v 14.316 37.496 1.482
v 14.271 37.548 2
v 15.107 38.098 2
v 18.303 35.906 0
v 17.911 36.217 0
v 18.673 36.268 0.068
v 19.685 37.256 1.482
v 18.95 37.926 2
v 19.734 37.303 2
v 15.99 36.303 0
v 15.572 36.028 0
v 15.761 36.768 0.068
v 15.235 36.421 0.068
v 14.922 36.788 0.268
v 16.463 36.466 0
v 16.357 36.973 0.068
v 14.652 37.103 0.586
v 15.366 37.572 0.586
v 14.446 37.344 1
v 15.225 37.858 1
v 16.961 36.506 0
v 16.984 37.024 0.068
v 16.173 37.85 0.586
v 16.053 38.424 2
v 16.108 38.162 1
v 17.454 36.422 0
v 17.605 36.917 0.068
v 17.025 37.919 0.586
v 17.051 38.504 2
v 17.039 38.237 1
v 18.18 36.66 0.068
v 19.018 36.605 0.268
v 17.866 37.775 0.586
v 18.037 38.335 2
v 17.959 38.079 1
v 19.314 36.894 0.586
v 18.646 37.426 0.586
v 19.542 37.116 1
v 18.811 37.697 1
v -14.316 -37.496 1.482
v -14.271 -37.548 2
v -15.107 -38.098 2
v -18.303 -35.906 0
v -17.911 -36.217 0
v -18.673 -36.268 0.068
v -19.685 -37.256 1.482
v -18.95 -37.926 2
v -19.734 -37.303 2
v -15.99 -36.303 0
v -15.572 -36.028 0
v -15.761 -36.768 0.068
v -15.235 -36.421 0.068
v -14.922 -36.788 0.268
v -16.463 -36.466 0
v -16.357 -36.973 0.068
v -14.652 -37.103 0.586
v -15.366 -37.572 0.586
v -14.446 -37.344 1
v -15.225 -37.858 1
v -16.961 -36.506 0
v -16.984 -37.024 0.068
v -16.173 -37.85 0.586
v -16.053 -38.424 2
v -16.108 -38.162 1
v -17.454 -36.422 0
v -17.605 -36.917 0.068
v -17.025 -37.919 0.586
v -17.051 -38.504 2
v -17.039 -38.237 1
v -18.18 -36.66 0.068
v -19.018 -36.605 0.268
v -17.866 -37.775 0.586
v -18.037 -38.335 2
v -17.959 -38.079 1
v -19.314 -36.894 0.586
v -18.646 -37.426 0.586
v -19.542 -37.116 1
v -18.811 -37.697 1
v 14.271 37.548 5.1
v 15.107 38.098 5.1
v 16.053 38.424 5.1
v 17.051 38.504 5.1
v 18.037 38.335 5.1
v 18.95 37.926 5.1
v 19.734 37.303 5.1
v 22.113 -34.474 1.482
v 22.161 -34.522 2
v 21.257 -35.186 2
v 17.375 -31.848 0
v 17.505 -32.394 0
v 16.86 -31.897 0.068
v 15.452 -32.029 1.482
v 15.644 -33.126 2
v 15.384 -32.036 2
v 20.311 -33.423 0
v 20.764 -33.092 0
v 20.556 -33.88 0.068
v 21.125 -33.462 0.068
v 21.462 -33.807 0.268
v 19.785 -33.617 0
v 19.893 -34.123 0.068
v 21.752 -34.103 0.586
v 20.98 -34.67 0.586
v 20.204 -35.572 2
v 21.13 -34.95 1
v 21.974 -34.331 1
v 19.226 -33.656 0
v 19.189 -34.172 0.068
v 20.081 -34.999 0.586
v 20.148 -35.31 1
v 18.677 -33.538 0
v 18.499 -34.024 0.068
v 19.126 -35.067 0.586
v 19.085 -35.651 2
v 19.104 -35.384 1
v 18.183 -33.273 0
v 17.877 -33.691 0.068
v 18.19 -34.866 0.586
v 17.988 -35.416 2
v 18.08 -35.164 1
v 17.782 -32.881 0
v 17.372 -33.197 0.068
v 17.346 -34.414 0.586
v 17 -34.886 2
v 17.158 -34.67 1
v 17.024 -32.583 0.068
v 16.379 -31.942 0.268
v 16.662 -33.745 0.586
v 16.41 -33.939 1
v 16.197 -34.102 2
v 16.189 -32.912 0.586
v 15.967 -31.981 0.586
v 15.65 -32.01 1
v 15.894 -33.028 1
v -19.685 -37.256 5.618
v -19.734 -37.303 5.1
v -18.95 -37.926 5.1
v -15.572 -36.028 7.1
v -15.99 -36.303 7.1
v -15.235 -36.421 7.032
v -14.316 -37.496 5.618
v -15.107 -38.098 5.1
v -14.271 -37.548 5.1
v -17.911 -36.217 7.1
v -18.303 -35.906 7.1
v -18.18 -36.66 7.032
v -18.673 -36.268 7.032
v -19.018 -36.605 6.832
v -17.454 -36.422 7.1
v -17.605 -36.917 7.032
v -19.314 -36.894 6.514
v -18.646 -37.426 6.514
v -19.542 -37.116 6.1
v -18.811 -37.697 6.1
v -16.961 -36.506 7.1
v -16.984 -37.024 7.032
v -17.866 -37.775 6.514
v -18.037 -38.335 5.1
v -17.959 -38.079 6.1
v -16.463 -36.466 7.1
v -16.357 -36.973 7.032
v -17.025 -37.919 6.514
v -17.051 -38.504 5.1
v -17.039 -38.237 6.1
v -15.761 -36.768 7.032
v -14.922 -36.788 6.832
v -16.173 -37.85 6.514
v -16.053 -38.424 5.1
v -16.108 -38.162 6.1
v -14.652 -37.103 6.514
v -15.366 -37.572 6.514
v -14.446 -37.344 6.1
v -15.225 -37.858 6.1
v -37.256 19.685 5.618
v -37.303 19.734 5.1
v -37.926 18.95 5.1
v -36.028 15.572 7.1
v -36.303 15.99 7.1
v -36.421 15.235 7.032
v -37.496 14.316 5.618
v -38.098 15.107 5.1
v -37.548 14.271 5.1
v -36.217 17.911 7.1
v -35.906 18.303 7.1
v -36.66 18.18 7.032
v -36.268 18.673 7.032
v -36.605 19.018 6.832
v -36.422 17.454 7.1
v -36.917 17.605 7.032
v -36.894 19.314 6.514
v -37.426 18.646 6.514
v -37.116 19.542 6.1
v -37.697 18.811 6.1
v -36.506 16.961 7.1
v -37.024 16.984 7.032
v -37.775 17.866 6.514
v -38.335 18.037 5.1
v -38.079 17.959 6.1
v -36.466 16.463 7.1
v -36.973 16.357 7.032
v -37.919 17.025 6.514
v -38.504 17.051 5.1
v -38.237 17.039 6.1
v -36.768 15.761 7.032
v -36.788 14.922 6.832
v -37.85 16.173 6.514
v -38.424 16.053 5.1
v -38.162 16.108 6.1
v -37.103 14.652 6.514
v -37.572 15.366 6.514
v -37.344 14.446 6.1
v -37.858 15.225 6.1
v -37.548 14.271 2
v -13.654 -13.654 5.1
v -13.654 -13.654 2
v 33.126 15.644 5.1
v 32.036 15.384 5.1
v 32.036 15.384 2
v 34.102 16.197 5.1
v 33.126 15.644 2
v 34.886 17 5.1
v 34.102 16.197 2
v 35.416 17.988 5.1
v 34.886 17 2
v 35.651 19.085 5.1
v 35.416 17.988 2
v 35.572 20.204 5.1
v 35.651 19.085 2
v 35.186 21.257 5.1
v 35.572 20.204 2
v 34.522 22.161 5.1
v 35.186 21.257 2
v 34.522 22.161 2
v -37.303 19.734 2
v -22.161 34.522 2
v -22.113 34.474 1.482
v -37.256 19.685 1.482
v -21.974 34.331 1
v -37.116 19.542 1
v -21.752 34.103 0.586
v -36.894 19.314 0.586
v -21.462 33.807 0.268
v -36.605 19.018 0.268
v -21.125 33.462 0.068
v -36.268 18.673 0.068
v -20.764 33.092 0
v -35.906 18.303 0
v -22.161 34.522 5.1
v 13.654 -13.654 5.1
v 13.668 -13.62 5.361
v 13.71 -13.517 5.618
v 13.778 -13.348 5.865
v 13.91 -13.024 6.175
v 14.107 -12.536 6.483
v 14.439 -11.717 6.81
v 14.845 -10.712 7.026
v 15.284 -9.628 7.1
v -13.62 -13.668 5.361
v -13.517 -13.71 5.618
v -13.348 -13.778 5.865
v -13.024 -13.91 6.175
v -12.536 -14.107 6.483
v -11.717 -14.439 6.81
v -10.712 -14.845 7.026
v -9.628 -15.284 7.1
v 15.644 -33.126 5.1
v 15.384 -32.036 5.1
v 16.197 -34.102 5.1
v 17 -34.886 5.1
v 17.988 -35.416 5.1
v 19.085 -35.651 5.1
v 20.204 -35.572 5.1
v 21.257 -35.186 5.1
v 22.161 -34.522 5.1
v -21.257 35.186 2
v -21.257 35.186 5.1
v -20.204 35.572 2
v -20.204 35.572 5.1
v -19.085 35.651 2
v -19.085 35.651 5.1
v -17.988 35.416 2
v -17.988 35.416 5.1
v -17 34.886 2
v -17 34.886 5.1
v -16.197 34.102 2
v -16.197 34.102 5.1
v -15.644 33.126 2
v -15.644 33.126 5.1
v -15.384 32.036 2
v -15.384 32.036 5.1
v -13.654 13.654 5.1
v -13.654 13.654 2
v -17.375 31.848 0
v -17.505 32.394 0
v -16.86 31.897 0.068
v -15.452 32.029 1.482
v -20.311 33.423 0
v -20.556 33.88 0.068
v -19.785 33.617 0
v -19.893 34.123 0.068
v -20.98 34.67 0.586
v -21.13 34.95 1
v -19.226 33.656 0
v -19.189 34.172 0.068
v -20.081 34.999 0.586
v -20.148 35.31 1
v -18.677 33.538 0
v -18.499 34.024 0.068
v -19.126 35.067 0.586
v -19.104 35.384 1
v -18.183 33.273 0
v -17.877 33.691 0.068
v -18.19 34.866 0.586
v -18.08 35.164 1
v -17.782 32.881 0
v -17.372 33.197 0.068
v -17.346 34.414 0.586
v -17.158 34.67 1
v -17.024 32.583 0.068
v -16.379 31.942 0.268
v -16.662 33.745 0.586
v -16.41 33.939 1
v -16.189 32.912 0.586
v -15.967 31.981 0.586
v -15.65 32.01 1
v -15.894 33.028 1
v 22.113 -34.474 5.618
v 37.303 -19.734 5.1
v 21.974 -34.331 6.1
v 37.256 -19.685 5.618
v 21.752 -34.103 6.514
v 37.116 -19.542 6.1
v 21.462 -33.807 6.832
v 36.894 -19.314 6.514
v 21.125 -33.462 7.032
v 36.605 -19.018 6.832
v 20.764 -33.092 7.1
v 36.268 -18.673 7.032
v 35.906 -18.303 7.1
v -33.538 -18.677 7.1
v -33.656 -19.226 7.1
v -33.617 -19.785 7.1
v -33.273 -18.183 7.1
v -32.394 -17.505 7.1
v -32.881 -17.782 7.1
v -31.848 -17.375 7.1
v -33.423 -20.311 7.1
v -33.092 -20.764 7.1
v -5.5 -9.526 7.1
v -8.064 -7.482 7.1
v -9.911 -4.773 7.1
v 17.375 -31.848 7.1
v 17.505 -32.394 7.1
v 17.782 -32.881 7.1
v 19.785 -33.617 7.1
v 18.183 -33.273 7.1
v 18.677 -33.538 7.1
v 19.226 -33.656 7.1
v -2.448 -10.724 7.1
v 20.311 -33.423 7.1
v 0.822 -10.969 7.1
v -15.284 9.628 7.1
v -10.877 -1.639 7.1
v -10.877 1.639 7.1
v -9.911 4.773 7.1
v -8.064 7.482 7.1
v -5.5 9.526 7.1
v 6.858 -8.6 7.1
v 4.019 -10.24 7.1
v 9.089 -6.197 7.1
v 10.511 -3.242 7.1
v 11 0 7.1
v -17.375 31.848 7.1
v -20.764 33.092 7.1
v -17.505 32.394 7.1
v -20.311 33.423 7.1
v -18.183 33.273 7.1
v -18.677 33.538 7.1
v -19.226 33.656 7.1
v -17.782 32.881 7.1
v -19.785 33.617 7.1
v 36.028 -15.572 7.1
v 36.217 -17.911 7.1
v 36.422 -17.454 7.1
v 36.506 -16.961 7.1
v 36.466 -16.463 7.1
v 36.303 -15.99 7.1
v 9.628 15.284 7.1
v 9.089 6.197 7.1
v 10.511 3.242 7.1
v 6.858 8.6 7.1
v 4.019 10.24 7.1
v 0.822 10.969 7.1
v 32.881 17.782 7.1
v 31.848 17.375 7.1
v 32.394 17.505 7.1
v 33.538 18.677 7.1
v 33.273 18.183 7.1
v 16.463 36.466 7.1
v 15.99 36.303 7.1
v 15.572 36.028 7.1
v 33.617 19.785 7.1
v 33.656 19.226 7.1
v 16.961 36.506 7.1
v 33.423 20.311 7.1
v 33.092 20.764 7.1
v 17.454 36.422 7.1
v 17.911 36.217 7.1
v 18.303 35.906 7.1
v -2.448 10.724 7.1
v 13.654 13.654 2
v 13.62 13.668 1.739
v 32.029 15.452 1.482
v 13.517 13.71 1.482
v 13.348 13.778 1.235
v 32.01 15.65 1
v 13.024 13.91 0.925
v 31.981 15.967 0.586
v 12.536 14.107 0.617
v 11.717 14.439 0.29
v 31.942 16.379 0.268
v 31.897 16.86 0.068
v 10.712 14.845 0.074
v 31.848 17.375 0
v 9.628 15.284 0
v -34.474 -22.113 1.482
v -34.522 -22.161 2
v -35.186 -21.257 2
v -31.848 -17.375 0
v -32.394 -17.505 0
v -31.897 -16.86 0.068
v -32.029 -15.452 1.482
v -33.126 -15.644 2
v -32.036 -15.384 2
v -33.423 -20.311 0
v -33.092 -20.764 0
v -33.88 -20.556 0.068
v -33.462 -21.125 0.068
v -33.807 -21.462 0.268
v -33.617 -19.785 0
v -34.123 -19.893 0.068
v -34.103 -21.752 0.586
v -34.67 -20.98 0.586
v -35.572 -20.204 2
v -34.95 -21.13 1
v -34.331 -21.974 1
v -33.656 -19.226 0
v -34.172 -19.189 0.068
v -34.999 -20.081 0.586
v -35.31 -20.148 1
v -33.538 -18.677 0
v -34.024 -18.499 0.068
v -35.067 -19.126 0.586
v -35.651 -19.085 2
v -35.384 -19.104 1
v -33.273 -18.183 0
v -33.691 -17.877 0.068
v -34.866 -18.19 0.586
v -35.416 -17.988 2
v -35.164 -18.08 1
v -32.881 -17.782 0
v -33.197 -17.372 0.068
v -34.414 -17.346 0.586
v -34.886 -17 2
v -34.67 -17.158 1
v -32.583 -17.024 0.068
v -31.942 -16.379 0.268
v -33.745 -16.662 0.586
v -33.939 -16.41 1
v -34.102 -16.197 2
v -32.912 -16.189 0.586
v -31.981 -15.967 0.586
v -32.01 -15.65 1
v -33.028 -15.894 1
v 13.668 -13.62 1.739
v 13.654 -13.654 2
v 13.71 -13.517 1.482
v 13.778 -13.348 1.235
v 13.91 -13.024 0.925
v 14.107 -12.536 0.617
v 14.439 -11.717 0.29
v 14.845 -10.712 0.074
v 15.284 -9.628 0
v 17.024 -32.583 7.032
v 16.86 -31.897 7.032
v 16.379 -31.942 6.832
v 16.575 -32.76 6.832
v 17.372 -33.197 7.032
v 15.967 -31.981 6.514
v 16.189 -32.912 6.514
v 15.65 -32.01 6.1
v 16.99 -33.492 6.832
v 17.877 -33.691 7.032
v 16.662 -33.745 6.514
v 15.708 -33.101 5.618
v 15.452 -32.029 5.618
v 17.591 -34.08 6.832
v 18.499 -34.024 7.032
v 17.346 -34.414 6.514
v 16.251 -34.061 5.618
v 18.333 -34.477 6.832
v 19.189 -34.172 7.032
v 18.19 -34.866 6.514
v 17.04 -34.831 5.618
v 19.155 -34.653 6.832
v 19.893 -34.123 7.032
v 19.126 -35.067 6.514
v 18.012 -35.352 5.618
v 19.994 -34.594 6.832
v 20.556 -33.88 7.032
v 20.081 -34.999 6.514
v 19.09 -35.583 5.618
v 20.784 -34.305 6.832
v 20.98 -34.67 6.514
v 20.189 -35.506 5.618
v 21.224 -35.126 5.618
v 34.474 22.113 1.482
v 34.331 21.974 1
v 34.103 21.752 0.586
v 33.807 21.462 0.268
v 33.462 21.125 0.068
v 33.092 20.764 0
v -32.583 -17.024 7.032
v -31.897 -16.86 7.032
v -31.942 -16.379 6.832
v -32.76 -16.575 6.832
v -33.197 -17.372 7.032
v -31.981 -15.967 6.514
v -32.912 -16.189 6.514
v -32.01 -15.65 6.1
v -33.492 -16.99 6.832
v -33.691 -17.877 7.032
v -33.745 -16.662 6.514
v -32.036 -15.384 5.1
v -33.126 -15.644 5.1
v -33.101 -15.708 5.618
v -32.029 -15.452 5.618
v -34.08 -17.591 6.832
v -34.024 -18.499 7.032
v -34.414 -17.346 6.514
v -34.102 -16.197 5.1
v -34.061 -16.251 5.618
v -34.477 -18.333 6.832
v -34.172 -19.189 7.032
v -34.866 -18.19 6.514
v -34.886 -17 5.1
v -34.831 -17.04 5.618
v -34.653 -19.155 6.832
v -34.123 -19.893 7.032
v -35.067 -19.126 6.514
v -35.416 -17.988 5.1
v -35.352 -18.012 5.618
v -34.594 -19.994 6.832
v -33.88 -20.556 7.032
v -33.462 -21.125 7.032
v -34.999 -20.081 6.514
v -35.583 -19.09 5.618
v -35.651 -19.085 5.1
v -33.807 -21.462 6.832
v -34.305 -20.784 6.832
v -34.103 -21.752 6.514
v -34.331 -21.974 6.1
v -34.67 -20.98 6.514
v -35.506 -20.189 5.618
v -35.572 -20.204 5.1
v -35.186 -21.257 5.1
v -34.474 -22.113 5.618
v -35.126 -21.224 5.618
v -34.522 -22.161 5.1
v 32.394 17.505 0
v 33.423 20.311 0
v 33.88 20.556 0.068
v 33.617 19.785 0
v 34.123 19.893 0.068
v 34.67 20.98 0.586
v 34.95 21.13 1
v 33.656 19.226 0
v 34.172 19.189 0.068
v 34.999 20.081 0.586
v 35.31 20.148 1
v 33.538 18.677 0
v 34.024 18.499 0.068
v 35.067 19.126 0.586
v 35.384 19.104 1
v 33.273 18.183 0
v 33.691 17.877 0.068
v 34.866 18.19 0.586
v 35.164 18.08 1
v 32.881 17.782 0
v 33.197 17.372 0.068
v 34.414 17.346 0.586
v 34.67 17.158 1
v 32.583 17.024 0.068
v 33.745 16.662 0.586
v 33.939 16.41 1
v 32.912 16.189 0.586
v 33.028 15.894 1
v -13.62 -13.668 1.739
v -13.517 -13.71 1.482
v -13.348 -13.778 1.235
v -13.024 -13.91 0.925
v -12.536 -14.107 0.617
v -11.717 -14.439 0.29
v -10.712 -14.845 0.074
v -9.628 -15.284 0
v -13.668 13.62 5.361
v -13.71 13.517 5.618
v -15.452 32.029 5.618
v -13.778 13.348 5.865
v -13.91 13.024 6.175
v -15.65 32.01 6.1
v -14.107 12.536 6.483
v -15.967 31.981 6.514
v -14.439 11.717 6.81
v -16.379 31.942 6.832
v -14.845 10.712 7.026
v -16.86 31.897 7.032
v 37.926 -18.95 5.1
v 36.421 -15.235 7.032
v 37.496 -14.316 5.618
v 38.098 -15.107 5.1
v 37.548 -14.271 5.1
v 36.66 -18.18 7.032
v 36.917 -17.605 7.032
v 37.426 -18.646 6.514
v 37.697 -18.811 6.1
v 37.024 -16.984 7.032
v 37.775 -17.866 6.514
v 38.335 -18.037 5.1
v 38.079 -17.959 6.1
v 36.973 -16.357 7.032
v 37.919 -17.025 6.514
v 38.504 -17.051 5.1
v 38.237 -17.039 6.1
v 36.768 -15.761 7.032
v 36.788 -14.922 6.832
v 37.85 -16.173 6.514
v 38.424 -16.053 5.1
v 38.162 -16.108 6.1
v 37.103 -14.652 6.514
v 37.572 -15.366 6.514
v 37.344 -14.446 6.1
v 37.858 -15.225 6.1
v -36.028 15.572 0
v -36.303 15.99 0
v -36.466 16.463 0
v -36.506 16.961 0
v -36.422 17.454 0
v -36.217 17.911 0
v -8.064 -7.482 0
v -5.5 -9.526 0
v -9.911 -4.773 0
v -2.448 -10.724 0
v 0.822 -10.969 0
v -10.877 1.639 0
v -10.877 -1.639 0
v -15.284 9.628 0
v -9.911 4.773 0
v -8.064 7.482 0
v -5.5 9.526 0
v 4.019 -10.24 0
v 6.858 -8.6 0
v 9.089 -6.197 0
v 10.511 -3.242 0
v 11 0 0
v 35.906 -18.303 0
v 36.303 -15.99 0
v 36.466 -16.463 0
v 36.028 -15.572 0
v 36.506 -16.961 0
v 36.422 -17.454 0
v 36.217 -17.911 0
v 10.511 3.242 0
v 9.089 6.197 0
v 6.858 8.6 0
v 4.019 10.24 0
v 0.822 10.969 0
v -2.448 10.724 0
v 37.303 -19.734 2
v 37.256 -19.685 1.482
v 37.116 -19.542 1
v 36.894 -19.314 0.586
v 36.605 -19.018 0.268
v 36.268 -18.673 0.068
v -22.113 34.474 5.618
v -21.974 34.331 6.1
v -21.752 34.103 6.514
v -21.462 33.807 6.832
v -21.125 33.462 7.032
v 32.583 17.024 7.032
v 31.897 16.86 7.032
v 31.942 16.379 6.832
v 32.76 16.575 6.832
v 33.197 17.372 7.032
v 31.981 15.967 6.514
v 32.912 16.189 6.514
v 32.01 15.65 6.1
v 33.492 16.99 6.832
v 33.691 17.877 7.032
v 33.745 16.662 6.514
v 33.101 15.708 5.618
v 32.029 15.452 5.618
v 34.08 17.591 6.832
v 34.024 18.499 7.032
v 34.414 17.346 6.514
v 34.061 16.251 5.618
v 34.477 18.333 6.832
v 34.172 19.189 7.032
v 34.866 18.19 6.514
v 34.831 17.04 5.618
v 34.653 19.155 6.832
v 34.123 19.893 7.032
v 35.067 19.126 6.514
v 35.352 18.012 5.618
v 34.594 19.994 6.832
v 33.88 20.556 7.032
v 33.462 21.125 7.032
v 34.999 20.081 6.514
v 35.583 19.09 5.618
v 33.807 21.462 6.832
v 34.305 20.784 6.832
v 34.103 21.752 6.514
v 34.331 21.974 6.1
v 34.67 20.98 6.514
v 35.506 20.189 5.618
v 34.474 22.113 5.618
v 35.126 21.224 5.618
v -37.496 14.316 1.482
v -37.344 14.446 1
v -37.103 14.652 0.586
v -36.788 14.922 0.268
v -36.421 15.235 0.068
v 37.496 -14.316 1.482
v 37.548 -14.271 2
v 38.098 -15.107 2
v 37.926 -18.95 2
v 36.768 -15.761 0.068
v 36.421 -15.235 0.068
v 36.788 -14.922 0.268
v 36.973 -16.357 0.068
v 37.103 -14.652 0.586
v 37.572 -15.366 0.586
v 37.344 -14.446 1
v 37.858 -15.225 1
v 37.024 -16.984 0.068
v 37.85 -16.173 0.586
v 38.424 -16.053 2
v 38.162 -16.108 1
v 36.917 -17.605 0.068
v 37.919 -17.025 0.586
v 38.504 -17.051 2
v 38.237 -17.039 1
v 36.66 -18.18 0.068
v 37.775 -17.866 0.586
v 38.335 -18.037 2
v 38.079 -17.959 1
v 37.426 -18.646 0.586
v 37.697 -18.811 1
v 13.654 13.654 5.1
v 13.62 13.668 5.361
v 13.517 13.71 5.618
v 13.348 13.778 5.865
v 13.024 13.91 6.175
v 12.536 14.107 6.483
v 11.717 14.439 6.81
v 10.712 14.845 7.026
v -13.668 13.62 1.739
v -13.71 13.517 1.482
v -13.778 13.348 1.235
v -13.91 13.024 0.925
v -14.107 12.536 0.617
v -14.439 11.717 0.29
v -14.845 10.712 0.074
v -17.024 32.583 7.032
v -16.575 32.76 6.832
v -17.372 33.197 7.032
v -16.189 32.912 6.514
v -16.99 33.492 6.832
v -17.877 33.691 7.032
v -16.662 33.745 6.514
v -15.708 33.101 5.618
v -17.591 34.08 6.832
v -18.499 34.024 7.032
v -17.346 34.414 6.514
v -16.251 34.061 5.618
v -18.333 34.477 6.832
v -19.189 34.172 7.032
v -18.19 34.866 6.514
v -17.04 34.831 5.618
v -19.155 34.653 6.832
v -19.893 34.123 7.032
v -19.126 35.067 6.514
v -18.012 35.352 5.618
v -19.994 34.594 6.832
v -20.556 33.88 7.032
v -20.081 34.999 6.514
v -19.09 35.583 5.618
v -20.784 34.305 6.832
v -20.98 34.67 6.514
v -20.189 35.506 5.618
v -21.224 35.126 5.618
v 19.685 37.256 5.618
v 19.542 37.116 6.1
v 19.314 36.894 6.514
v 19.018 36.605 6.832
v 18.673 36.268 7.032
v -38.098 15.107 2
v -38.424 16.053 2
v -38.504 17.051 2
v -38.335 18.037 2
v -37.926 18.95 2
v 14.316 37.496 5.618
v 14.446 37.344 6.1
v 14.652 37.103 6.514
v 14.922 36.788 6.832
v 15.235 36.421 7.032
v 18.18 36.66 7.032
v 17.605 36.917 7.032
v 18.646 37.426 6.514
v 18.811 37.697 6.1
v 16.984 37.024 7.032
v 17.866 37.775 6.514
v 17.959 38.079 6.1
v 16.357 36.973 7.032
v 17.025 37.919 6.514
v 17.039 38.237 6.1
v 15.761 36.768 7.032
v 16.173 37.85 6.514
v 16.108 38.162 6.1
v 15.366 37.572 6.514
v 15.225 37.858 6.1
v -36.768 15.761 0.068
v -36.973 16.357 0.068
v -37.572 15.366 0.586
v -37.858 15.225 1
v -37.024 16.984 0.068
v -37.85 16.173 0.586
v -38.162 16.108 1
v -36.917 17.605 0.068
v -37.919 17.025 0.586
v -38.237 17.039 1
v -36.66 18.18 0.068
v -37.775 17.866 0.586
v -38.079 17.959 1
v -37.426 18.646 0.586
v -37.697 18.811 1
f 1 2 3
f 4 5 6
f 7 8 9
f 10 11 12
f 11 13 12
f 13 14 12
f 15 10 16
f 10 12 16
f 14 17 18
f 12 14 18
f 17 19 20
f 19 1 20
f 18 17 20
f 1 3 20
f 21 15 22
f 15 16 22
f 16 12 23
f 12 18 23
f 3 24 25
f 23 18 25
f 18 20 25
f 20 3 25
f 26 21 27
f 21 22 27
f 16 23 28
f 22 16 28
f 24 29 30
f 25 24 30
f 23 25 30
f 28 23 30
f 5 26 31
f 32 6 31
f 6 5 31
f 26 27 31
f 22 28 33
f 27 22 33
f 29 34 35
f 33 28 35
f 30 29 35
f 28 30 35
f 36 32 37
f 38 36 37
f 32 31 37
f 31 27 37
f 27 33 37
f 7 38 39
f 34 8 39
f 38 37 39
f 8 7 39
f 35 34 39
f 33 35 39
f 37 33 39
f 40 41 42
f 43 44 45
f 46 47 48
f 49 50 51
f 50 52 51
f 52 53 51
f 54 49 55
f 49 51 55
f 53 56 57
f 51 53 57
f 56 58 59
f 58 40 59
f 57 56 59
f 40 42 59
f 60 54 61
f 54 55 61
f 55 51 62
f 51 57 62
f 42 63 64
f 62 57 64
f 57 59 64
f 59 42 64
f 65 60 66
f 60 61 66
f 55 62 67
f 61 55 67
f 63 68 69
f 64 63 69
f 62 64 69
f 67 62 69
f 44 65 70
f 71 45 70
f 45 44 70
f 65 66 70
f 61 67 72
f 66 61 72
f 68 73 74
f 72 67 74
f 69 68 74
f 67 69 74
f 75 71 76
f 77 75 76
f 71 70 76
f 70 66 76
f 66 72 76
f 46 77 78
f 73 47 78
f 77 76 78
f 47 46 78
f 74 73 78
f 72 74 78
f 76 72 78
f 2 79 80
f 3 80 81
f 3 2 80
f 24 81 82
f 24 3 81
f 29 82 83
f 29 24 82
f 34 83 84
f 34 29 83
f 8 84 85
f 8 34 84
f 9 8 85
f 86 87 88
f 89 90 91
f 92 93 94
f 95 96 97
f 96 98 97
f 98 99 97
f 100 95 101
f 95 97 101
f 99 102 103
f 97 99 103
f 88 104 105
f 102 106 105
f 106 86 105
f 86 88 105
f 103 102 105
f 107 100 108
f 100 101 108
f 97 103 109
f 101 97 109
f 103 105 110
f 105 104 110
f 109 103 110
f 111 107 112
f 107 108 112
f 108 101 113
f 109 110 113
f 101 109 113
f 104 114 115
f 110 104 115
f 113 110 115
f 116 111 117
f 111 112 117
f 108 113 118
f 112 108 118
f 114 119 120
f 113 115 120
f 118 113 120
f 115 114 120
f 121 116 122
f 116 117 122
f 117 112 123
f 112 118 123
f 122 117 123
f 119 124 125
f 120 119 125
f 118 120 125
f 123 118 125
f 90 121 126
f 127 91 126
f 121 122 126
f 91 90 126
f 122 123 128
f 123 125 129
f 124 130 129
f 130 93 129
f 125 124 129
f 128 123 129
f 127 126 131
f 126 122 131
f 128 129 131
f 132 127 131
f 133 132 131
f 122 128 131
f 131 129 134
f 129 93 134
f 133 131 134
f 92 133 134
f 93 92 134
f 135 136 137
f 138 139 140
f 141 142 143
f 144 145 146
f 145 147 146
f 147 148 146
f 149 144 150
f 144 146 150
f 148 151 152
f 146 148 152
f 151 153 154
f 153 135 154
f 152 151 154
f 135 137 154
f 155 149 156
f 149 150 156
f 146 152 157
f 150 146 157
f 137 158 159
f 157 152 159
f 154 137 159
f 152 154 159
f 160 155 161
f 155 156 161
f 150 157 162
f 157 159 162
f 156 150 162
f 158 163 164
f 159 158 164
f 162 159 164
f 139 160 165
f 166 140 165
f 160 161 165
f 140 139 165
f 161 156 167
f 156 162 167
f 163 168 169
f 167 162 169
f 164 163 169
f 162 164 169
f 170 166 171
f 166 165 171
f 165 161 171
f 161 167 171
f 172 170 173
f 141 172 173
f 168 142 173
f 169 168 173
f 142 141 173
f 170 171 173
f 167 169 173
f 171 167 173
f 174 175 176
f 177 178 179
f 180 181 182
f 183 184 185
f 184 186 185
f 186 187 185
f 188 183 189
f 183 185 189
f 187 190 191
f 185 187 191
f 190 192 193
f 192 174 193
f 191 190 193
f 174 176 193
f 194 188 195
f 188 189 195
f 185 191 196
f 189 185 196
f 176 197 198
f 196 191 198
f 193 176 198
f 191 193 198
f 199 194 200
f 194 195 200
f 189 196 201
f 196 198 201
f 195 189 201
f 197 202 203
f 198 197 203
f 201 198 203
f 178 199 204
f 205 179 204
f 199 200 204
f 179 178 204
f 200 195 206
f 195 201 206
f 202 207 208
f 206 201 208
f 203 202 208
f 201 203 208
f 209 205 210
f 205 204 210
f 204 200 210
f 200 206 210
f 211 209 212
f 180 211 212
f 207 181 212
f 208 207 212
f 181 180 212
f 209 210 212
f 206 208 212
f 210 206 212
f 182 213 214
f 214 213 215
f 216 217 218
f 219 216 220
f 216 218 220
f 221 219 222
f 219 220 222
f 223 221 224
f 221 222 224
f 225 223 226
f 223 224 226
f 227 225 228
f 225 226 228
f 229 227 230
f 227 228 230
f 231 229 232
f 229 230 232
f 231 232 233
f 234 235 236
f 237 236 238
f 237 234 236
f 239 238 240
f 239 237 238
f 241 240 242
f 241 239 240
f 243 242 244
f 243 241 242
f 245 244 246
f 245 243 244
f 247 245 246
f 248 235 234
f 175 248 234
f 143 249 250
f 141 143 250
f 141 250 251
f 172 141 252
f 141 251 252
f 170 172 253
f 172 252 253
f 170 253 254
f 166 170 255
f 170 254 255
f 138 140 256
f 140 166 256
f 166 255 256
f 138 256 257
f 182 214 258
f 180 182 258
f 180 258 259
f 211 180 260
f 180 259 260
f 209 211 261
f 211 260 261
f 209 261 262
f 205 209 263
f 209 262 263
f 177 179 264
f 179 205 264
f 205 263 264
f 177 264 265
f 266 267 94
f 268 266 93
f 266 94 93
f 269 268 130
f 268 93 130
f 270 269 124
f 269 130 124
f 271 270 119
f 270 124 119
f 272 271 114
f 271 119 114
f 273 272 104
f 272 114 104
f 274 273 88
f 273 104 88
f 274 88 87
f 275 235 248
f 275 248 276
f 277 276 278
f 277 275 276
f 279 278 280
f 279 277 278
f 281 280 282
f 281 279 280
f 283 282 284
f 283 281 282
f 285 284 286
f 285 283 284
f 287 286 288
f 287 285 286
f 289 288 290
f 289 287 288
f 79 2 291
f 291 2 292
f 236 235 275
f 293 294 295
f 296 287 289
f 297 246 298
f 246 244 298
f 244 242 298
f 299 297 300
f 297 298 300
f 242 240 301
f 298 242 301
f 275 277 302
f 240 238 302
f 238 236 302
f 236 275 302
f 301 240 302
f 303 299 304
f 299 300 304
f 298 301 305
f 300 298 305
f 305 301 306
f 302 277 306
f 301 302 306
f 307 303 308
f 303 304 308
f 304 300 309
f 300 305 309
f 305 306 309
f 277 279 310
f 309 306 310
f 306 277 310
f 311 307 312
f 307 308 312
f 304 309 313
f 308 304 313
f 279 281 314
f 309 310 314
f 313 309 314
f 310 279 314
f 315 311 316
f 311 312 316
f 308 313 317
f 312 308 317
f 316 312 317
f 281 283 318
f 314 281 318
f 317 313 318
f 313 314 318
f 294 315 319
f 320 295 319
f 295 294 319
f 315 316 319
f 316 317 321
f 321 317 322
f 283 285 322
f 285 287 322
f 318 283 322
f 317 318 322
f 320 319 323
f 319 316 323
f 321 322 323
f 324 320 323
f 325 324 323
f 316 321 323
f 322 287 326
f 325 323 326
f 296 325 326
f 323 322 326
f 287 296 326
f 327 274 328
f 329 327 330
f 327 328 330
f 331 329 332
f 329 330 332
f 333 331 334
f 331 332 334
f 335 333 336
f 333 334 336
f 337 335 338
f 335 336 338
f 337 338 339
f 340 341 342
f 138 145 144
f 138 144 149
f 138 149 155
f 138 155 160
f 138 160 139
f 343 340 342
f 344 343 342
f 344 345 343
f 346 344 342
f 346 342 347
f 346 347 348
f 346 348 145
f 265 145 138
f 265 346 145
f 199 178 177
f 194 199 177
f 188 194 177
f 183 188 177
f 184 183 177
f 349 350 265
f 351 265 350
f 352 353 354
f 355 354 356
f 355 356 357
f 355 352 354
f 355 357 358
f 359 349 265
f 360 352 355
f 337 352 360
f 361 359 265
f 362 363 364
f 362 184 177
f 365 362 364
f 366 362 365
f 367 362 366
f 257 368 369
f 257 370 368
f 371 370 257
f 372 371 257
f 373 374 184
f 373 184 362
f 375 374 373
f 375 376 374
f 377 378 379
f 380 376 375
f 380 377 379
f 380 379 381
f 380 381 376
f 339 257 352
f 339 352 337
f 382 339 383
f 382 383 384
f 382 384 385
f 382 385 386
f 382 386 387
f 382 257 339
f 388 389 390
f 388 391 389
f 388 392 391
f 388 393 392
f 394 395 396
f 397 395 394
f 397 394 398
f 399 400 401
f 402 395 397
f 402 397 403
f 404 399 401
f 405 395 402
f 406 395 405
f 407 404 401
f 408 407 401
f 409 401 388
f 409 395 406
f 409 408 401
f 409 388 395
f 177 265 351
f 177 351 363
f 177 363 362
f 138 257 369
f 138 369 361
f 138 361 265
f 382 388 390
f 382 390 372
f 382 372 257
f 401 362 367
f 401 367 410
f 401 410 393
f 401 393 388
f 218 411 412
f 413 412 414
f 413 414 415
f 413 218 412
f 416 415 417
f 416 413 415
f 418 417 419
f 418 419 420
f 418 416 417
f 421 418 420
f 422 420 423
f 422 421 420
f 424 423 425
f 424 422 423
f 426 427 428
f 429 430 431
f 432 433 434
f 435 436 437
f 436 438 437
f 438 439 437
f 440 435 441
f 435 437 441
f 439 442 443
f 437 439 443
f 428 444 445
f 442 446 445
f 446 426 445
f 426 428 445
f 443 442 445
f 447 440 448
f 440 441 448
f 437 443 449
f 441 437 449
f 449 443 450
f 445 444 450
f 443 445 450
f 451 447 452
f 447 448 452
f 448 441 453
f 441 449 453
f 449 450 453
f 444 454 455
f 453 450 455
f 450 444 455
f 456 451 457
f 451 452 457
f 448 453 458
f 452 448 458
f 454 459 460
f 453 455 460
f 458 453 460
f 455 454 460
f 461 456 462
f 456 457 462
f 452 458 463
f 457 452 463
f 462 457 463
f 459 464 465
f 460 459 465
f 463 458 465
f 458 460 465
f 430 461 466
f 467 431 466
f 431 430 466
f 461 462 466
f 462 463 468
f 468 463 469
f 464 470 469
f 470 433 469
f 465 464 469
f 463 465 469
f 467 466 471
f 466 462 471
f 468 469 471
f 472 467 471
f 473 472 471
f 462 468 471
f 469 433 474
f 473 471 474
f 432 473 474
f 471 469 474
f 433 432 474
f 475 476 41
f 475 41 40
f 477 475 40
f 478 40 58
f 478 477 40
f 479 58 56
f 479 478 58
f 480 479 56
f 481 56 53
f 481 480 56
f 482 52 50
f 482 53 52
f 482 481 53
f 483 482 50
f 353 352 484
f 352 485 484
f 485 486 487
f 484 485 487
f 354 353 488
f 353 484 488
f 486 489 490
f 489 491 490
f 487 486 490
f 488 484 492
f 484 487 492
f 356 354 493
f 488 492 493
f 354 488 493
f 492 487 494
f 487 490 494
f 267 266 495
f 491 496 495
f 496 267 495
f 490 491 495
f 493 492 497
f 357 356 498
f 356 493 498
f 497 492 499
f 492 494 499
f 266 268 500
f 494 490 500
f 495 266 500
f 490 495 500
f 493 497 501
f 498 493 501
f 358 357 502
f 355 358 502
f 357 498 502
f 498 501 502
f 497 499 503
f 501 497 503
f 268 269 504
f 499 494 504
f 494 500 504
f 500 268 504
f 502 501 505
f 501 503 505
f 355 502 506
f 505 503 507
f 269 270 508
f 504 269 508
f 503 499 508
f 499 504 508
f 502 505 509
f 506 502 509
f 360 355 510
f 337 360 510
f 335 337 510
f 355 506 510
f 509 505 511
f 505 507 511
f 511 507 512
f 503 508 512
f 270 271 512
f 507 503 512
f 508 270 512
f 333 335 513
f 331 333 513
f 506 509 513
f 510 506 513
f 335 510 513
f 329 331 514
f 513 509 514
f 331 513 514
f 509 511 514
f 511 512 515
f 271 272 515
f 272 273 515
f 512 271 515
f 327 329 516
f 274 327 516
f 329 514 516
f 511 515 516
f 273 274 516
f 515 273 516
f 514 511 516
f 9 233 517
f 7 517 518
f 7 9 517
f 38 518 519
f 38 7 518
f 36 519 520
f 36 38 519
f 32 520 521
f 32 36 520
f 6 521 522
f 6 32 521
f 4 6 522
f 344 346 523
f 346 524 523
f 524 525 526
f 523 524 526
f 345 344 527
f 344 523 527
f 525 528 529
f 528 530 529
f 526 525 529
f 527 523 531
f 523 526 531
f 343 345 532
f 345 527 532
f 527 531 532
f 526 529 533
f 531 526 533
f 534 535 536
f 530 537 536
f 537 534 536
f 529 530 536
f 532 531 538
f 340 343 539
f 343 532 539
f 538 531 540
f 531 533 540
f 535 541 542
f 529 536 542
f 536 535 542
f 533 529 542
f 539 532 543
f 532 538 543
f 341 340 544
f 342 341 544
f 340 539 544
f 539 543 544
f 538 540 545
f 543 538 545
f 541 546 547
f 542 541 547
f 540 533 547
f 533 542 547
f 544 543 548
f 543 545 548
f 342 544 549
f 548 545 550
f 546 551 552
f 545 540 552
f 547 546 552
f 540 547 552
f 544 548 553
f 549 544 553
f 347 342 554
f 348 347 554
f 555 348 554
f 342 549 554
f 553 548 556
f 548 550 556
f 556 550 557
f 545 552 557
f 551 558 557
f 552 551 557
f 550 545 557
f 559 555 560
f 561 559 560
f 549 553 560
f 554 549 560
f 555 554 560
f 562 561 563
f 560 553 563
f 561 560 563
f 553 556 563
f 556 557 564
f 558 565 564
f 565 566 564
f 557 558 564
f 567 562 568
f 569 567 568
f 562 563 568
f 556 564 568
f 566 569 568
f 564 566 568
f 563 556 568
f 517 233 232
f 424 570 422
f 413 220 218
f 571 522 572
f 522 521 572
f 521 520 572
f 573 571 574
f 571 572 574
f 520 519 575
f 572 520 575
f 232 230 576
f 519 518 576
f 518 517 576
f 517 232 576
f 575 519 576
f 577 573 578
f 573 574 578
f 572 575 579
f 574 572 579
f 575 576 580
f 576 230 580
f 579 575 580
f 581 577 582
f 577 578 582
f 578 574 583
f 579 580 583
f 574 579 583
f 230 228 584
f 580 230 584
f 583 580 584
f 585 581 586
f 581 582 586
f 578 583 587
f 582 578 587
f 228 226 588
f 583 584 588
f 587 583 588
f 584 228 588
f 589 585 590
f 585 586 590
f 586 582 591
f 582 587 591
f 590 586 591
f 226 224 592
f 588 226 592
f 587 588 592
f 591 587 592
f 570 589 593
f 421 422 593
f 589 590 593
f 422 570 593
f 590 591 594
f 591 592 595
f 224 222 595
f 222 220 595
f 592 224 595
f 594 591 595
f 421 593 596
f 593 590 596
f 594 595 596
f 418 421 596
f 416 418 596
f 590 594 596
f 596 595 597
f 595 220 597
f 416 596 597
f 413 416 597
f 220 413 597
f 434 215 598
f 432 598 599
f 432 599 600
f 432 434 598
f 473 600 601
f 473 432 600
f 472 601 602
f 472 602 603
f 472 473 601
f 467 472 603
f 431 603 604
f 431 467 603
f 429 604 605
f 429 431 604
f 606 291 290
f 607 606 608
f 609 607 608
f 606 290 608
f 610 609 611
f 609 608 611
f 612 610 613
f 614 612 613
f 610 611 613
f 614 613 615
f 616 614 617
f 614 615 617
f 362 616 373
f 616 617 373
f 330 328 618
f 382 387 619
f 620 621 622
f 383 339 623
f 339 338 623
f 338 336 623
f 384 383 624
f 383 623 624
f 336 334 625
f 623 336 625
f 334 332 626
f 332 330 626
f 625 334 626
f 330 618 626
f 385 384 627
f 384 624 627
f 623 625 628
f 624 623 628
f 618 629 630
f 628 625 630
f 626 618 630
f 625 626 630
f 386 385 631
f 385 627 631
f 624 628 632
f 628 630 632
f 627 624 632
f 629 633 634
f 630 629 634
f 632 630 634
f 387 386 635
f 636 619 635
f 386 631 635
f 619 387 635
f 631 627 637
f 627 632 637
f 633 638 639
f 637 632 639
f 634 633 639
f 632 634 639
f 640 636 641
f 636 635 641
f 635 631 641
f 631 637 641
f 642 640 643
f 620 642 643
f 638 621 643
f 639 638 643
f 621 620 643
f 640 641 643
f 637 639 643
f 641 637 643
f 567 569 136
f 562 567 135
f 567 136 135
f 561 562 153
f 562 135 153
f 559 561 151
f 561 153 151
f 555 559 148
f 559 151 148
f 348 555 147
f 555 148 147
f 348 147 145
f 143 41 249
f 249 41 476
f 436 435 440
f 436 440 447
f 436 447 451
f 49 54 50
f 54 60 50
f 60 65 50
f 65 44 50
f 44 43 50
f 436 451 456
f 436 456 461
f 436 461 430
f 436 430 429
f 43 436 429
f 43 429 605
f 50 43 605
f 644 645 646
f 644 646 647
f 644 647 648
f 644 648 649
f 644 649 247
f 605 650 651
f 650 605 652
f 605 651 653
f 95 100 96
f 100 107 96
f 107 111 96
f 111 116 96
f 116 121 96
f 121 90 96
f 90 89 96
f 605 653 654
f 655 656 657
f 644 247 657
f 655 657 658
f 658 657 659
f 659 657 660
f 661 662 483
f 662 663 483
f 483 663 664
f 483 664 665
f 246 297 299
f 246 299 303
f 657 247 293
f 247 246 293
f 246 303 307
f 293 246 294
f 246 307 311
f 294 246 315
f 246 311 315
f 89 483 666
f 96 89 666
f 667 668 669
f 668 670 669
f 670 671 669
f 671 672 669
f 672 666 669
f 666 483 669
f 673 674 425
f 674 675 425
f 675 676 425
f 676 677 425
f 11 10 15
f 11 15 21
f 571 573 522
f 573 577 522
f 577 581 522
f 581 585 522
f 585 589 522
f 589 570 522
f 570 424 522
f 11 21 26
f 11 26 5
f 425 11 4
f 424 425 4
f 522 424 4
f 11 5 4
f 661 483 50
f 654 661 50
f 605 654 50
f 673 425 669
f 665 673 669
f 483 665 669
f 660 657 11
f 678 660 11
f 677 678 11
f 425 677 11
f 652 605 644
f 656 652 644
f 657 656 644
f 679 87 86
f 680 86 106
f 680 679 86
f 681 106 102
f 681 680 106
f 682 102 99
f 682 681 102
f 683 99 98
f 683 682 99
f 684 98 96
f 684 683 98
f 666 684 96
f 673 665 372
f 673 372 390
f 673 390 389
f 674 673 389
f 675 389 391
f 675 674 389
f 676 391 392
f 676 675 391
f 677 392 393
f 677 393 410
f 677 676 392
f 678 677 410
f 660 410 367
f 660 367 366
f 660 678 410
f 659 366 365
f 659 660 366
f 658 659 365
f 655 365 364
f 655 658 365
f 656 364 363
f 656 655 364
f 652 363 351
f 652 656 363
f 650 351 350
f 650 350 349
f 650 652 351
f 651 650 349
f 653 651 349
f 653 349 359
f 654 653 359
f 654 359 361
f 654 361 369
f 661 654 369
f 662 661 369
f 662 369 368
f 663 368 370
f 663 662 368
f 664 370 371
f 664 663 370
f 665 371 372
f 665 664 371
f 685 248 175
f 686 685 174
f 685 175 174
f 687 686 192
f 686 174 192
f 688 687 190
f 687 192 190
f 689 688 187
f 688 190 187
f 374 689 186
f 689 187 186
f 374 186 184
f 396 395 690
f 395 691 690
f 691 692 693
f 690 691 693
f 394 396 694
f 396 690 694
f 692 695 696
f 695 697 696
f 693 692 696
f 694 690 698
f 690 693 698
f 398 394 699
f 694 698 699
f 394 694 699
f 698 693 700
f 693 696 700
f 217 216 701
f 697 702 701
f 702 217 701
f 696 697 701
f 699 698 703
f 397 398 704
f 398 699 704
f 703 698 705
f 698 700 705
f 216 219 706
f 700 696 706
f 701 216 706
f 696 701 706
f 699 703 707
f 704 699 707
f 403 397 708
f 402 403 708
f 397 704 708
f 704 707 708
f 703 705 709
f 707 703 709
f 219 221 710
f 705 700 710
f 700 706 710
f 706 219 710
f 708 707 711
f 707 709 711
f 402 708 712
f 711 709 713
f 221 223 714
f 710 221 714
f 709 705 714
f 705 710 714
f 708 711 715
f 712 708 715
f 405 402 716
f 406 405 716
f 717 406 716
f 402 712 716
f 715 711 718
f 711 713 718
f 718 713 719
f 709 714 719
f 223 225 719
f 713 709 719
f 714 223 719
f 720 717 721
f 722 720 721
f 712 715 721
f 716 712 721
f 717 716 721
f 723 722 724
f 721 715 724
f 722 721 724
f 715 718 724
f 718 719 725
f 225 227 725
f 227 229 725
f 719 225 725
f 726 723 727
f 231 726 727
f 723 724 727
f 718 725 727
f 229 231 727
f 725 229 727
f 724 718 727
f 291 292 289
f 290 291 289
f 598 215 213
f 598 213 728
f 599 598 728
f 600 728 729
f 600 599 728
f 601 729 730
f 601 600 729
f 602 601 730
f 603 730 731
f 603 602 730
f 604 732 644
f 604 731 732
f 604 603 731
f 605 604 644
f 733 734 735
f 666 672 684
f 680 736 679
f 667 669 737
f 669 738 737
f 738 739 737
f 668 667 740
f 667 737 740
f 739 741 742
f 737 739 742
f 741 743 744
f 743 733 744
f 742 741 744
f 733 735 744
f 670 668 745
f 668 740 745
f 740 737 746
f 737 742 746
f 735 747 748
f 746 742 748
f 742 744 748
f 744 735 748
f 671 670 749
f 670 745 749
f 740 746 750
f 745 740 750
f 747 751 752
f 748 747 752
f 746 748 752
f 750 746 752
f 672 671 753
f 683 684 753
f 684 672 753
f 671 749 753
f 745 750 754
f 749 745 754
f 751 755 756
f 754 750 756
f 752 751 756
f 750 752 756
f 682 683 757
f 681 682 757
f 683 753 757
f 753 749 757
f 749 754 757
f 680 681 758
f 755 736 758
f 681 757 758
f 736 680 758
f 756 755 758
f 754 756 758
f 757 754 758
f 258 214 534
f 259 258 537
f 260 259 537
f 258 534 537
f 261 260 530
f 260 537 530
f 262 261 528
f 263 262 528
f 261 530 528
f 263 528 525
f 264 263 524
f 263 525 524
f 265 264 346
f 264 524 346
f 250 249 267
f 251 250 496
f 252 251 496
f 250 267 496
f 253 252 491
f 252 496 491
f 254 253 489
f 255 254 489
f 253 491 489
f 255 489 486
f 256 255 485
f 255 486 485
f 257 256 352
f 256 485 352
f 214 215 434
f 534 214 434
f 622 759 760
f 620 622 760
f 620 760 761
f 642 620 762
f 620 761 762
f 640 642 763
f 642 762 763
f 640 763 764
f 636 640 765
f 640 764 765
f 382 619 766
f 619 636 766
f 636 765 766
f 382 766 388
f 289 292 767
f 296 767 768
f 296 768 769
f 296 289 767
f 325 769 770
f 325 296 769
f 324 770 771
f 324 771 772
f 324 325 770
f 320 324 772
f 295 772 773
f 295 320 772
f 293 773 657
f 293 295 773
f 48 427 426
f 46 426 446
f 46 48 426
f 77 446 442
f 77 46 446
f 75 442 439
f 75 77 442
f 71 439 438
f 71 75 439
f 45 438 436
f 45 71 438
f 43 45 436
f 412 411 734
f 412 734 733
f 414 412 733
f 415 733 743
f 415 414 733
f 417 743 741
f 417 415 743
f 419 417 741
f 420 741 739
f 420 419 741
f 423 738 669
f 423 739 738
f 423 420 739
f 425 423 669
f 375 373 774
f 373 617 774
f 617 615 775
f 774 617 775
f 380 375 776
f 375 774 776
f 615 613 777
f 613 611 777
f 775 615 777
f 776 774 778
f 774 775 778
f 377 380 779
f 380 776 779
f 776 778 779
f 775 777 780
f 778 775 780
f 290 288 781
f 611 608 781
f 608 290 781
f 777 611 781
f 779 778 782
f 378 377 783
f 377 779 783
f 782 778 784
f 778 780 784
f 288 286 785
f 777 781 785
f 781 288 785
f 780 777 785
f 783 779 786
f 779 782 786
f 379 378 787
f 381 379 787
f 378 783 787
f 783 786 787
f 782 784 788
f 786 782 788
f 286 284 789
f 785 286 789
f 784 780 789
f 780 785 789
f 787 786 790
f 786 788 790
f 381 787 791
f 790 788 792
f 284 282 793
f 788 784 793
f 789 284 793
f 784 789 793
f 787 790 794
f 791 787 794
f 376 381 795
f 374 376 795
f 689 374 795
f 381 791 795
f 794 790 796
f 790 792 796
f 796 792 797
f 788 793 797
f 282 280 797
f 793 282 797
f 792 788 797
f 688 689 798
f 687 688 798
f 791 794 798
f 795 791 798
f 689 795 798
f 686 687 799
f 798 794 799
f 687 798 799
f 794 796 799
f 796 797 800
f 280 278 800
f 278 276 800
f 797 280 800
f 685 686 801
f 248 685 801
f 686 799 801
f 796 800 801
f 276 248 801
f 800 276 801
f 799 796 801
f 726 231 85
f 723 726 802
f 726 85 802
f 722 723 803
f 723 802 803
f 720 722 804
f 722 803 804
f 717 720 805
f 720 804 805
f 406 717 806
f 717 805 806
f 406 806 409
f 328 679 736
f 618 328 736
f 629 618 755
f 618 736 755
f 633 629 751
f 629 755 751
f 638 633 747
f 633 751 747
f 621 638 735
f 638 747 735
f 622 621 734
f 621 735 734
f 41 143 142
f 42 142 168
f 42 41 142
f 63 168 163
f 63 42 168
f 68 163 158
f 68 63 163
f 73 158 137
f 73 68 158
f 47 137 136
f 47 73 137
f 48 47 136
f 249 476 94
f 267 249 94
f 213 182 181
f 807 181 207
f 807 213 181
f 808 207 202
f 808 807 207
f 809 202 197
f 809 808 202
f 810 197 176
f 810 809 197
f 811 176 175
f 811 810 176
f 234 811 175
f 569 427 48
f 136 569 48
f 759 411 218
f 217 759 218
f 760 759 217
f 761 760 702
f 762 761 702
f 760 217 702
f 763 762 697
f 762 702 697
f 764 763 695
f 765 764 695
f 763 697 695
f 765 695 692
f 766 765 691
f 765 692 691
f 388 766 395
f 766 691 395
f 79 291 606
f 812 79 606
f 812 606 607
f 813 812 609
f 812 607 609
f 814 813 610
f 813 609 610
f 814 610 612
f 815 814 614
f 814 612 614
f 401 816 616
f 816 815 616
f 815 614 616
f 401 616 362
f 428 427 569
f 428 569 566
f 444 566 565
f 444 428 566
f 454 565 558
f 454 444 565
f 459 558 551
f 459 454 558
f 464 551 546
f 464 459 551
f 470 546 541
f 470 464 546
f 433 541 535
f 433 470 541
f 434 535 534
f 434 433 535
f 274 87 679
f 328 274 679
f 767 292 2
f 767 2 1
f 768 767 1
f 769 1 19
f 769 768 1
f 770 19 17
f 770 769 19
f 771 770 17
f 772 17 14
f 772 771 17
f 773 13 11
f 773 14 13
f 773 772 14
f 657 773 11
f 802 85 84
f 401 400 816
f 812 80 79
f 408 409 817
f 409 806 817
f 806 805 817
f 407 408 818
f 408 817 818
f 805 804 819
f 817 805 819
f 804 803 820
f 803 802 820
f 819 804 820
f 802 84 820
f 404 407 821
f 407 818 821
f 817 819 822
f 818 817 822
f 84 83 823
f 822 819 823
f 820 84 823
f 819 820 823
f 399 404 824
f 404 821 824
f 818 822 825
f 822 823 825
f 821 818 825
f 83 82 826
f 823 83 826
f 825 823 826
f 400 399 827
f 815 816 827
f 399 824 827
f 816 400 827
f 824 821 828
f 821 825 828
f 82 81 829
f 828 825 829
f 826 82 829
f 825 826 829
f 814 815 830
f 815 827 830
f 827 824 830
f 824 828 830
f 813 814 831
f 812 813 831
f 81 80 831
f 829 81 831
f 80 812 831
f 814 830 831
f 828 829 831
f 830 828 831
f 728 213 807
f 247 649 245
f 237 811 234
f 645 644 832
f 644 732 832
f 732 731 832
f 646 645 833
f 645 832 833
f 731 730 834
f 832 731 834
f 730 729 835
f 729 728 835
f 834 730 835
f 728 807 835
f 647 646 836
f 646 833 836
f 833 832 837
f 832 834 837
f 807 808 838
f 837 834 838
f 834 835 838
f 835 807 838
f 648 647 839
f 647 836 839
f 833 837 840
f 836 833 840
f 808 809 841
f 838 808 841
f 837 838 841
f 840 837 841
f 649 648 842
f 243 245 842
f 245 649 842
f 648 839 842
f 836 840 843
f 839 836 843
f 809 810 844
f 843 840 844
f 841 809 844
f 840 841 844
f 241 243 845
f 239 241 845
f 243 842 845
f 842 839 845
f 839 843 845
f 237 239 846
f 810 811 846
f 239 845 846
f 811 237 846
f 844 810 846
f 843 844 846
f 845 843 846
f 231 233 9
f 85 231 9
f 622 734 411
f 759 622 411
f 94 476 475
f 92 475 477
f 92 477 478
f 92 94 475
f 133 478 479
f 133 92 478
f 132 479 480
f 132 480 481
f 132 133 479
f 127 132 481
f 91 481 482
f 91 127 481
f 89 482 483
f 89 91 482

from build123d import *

# Parameters (mm, degrees)
F0_W         = 27.3088011891
F0_H         = 27.3088011891
F0_R         = 11
F1_DEPTH     = 7.1
F2_R         = 2
F3_T1_DEPTH  = 7.1
F3_T4_ANGLE  = 128.9490479257
F3_T6_ANGLE  = 128.9490479257
F3_T8_ANGLE  = 128.9490479257
F3_T10_ANGLE = 128.9490479257
F3_T12_ANGLE = 128.9490479257
F3_T14_ANGLE = 128.9490479257
F3_T16_ANGLE = 128.9490479257
F3_T18_ANGLE = 128.9490479257
F3_T20_ANGLE = 86.2266707628
F3_T22_ANGLE = 86.2266707628
F3_T24_ANGLE = 86.2266707628
F3_T26_ANGLE = 86.2266707628
F3_T28_ANGLE = 86.2266707628
F3_T30_ANGLE = 86.2266707628
F3_T32_ANGLE = 86.2266707628
F3_T34_ANGLE = 86.2266707628


# Not quite as in the source:
# - a fillet or chamfer that OpenCascade refuses, or shapes differently, is made with other operations: its cross-section is extruded or revolved along the edge and cut away or added


with BuildPart() as f1:
    # F0 (on Top) → F1 (new body)
    with BuildSketch(Plane.XY):
        Rectangle(F0_W, F0_H)
        Circle(F0_R, mode=Mode.SUBTRACT)
        Polygon((13.6544005945, 13.6544005945), (40.3753073238, 16.1683388102), (17.1169115879, 39.9823956144), (-13.6544005945, 13.6544005945), align=None)
        Polygon((16.1683388102, -40.3753073238), (39.9823956144, -17.1169115879), (13.6544005945, 13.6544005945), (13.6544005945, -13.6544005945), align=None)
        Polygon((-40.3753073238, -16.1683388102), (-17.1169115879, -39.9823956144), (13.6544005945, -13.6544005945), (-13.6544005945, -13.6544005945), align=None)
        Polygon((-13.6544005945, -13.6544005945), (-13.6544005945, 13.6544005945), (-16.1683388102, 40.3753073238), (-39.9823956144, 17.1169115879), align=None)
    extrude(amount=F1_DEPTH)

    # F2
    f2_edges = [f1.edges().sort_by_distance(p)[0] for p in [
        (-1.731255, -26.818398, 7.1),
        (14.91137, -27.014854, 7.1),
        (28.075367, -28.746109, 7.1),
        (26.818398, -1.731255, 7.1),
        (27.014854, 14.91137, 7.1),
        (28.746109, 28.075367, 7.1),
        (1.731255, 26.818398, 7.1),
        (-14.91137, 27.014854, 7.1),
        (-28.075367, 28.746109, 7.1),
        (-26.818398, 1.731255, 7.1),
        (-27.014854, -14.91137, 7.1),
        (-28.746109, -28.075367, 7.1),
        (-28.746109, -28.075367, 0),
        (-27.014854, -14.91137, 0),
        (-26.818398, 1.731255, 0),
        (-28.075367, 28.746109, 0),
        (-14.91137, 27.014854, 0),
        (1.731255, 26.818398, 0),
        (28.746109, 28.075367, 0),
        (27.014854, 14.91137, 0),
        (26.818398, -1.731255, 0),
        (28.075367, -28.746109, 0),
        (14.91137, -27.014854, 0),
        (-1.731255, -26.818398, 0),
    ]]
    fillet(f2_edges, radius=F2_R)

    # F3: fillet of radius 4 on 8 edges, made by hand

    # F3_s2 → F3_t1 (cut)
    with BuildSketch(Plane.XY):
        with BuildLine():
            ThreePointArc((37.3032935738, -19.7335012764), (38.5044476922, -17.050755387), (37.5477883044, -14.2714210172))
            Line((37.5477883044, -14.2714210172), (39.9823956144, -17.1169115879))
            Line((39.9823956144, -17.1169115879), (37.3032935738, -19.7335012764))
        make_face()
        with BuildLine():
            ThreePointArc((14.2714210172, 37.5477883044), (17.050755387, 38.5044476922), (19.7335012764, 37.3032935738))
            Line((19.7335012764, 37.3032935738), (17.1169115879, 39.9823956144))
            Line((17.1169115879, 39.9823956144), (14.2714210172, 37.5477883044))
        make_face()
        with BuildLine():
            ThreePointArc((-37.5477883044, 14.2714210172), (-38.5044476922, 17.050755387), (-37.3032935738, 19.7335012764))
            Line((-37.3032935738, 19.7335012764), (-39.9823956144, 17.1169115879))
            Line((-39.9823956144, 17.1169115879), (-37.5477883044, 14.2714210172))
        make_face()
        with BuildLine():
            ThreePointArc((-14.2714210172, -37.5477883044), (-17.050755387, -38.5044476922), (-19.7335012764, -37.3032935738))
            Line((-19.7335012764, -37.3032935738), (-17.1169115879, -39.9823956144))
            Line((-17.1169115879, -39.9823956144), (-14.2714210172, -37.5477883044))
        make_face()
        with BuildLine():
            ThreePointArc((15.383723208, -32.0355477412), (17.988166327, -35.4160328938), (22.1609818603, -34.5224925468))
            Line((22.1609818603, -34.5224925468), (16.1683388102, -40.3753073238))
            Line((16.1683388102, -40.3753073238), (15.383723208, -32.0355477412))
        make_face()
        with BuildLine():
            ThreePointArc((-34.5224925468, -22.1609818603), (-35.4160328938, -17.988166327), (-32.0355477412, -15.383723208))
            Line((-32.0355477412, -15.383723208), (-40.3753073238, -16.1683388102))
            Line((-40.3753073238, -16.1683388102), (-34.5224925468, -22.1609818603))
        make_face()
        with BuildLine():
            ThreePointArc((-22.1609818603, 34.5224925468), (-17.988166327, 35.4160328938), (-15.383723208, 32.0355477412))
            Line((-15.383723208, 32.0355477412), (-16.1683388102, 40.3753073238))
            Line((-16.1683388102, 40.3753073238), (-22.1609818603, 34.5224925468))
        make_face()
        with BuildLine():
            ThreePointArc((32.0355477412, 15.383723208), (35.4160328938, 17.988166327), (34.5224925468, 22.1609818603))
            Line((34.5224925468, 22.1609818603), (40.3753073238, 16.1683388102))
            Line((40.3753073238, 16.1683388102), (32.0355477412, 15.383723208))
        make_face()
    extrude(amount=F3_T1_DEPTH, mode=Mode.SUBTRACT)

    # F3_s3 → F3_t4 (revolve, cut)
    with BuildSketch(Plane(origin=(5.776383091, -5.914385352, 0), x_dir=(0, 0, 1), z_dir=(-0.6987111461, 0.7154038959, 0))):
        with BuildLine():
            ThreePointArc((0, 38.1816506997), (0.5857864376, 39.5958642621), (2, 40.1816506997))
            Line((2, 40.1816506997), (0, 40.1816506997))
            Line((0, 40.1816506997), (0, 38.1816506997))
        make_face()
    revolve(axis=Axis((31.6608769631, 19.3661372759, 0), (0, 0, -1)), revolution_arc=F3_T4_ANGLE, mode=Mode.SUBTRACT)

    # F3_s5 → F3_t6 (revolve, cut)
    with BuildSketch(Plane(origin=(33.1891022135, 3.1224745943, 0), x_dir=(0, 0, 1), z_dir=(-0.995603517, -0.0936676945, 0))):
        with BuildLine():
            ThreePointArc((7.1, 14.3153930302), (6.5142135624, 12.9011794678), (5.1, 12.3153930302))
            Line((5.1, 12.3153930302), (7.1, 12.3153930302))
            Line((7.1, 12.3153930302), (7.1, 14.3153930302))
        make_face()
    revolve(axis=Axis((31.6608769631, 19.3661372759, 7.1), (0, 0, 1)), revolution_arc=F3_T6_ANGLE, mode=Mode.SUBTRACT)

    # F3_s7 → F3_t8 (revolve, cut)
    with BuildSketch(Plane(origin=(5.914385352, 5.776383091, 0), x_dir=(0, 0, 1), z_dir=(-0.7154038959, -0.6987111461, 0))):
        with BuildLine():
            ThreePointArc((0, 38.1816506997), (0.5857864376, 39.5958642621), (2, 40.1816506997))
            Line((2, 40.1816506997), (0, 40.1816506997))
            Line((0, 40.1816506997), (0, 38.1816506997))
        make_face()
    revolve(axis=Axis((-19.3661372759, 31.6608769631, 0), (0, 0, -1)), revolution_arc=F3_T8_ANGLE, mode=Mode.SUBTRACT)

    # F3_s9 → F3_t10 (revolve, cut)
    with BuildSketch(Plane(origin=(-3.1224745943, 33.1891022135, 0), x_dir=(0, 0, 1), z_dir=(0.0936676945, -0.995603517, 0))):
        with BuildLine():
            ThreePointArc((7.1, 14.3153930302), (6.5142135624, 12.9011794678), (5.1, 12.3153930302))
            Line((5.1, 12.3153930302), (7.1, 12.3153930302))
            Line((7.1, 12.3153930302), (7.1, 14.3153930302))
        make_face()
    revolve(axis=Axis((-19.3661372759, 31.6608769631, 7.1), (0, 0, 1)), revolution_arc=F3_T10_ANGLE, mode=Mode.SUBTRACT)

    # F3_s11 → F3_t12 (revolve, cut)
    with BuildSketch(Plane(origin=(-5.776383091, 5.914385352, 0), x_dir=(0, 0, 1), z_dir=(0.6987111461, -0.7154038959, 0))):
        with BuildLine():
            ThreePointArc((0, 38.1816506997), (0.5857864376, 39.5958642621), (2, 40.1816506997))
            Line((2, 40.1816506997), (0, 40.1816506997))
            Line((0, 40.1816506997), (0, 38.1816506997))
        make_face()
    revolve(axis=Axis((-31.6608769631, -19.3661372759, 0), (0, 0, -1)), revolution_arc=F3_T12_ANGLE, mode=Mode.SUBTRACT)

    # F3_s13 → F3_t14 (revolve, cut)
    with BuildSketch(Plane(origin=(-33.1891022135, -3.1224745943, 0), x_dir=(0, 0, 1), z_dir=(0.995603517, 0.0936676945, 0))):
        with BuildLine():
            ThreePointArc((7.1, 14.3153930302), (6.5142135624, 12.9011794678), (5.1, 12.3153930302))
            Line((5.1, 12.3153930302), (7.1, 12.3153930302))
            Line((7.1, 12.3153930302), (7.1, 14.3153930302))
        make_face()
    revolve(axis=Axis((-31.6608769631, -19.3661372759, 7.1), (0, 0, 1)), revolution_arc=F3_T14_ANGLE, mode=Mode.SUBTRACT)

    # F3_s15 → F3_t16 (revolve, cut)
    with BuildSketch(Plane(origin=(-5.914385352, -5.776383091, 0), x_dir=(0, 0, 1), z_dir=(0.7154038959, 0.6987111461, 0))):
        with BuildLine():
            ThreePointArc((0, 38.1816506997), (0.5857864376, 39.5958642621), (2, 40.1816506997))
            Line((2, 40.1816506997), (0, 40.1816506997))
            Line((0, 40.1816506997), (0, 38.1816506997))
        make_face()
    revolve(axis=Axis((19.3661372759, -31.6608769631, 0), (0, 0, -1)), revolution_arc=F3_T16_ANGLE, mode=Mode.SUBTRACT)

    # F3_s17 → F3_t18 (revolve, cut)
    with BuildSketch(Plane(origin=(3.1224745943, -33.1891022135, 0), x_dir=(0, 0, 1), z_dir=(-0.0936676945, 0.995603517, 0))):
        with BuildLine():
            ThreePointArc((7.1, 14.3153930302), (6.5142135624, 12.9011794678), (5.1, 12.3153930302))
            Line((5.1, 12.3153930302), (7.1, 12.3153930302))
            Line((7.1, 12.3153930302), (7.1, 14.3153930302))
        make_face()
    revolve(axis=Axis((19.3661372759, -31.6608769631, 7.1), (0, 0, 1)), revolution_arc=F3_T18_ANGLE, mode=Mode.SUBTRACT)

    # F3_s19 → F3_t20 (revolve, cut)
    with BuildSketch(Plane(origin=(-26.7874807354, -22.9194210249, 0), x_dir=(0, 0, 1), z_dir=(0.7598348287, 0.6501161689, 0))):
        with BuildLine():
            ThreePointArc((0, 17.2520357401), (0.5857864376, 18.6662493025), (2, 19.2520357401))
            Line((2, 19.2520357401), (0, 19.2520357401))
            Line((0, 19.2520357401), (0, 17.2520357401))
        make_face()
    revolve(axis=Axis((-16.8718856926, -34.5084489895, 0), (0, 0, -1)), revolution_arc=F3_T20_ANGLE, mode=Mode.SUBTRACT)

    # F3_s21 → F3_t22 (revolve, cut)
    with BuildSketch(Plane(origin=(9.0126081794, -9.2279263615, 0), x_dir=(0, 0, 1), z_dir=(-0.6987111461, 0.7154038959, 0))):
        with BuildLine():
            ThreePointArc((7.1, -38.1816506997), (6.5142135624, -39.5958642621), (5.1, -40.1816506997))
            Line((5.1, -40.1816506997), (7.1, -40.1816506997))
            Line((7.1, -40.1816506997), (7.1, -38.1816506997))
        make_face()
    revolve(axis=Axis((-16.8718856926, -34.5084489895, 7.1), (0, 0, 1)), revolution_arc=F3_T22_ANGLE, mode=Mode.SUBTRACT)

    # F3_s23 → F3_t24 (revolve, cut)
    with BuildSketch(Plane(origin=(-22.9194210249, 26.7874807354, 0), x_dir=(0, 0, 1), z_dir=(0.6501161689, -0.7598348287, 0))):
        with BuildLine():
            ThreePointArc((0, 17.2520357401), (0.5857864376, 18.6662493025), (2, 19.2520357401))
            Line((2, 19.2520357401), (0, 19.2520357401))
            Line((0, 19.2520357401), (0, 17.2520357401))
        make_face()
    revolve(axis=Axis((-34.5084489895, 16.8718856926, 0), (0, 0, -1)), revolution_arc=F3_T24_ANGLE, mode=Mode.SUBTRACT)

    # F3_s25 → F3_t26 (revolve, cut)
    with BuildSketch(Plane(origin=(-9.2279263615, -9.0126081794, 0), x_dir=(0, 0, 1), z_dir=(0.7154038959, 0.6987111461, 0))):
        with BuildLine():
            ThreePointArc((7.1, -38.1816506997), (6.5142135624, -39.5958642621), (5.1, -40.1816506997))
            Line((5.1, -40.1816506997), (7.1, -40.1816506997))
            Line((7.1, -40.1816506997), (7.1, -38.1816506997))
        make_face()
    revolve(axis=Axis((-34.5084489895, 16.8718856926, 7.1), (0, 0, 1)), revolution_arc=F3_T26_ANGLE, mode=Mode.SUBTRACT)

    # F3_s27 → F3_t28 (revolve, cut)
    with BuildSketch(Plane(origin=(26.7874807354, 22.9194210249, 0), x_dir=(0, 0, 1), z_dir=(-0.7598348287, -0.6501161689, 0))):
        with BuildLine():
            ThreePointArc((0, 17.2520357401), (0.5857864376, 18.6662493025), (2, 19.2520357401))
            Line((2, 19.2520357401), (0, 19.2520357401))
            Line((0, 19.2520357401), (0, 17.2520357401))
        make_face()
    revolve(axis=Axis((16.8718856926, 34.5084489895, 0), (0, 0, -1)), revolution_arc=F3_T28_ANGLE, mode=Mode.SUBTRACT)

    # F3_s29 → F3_t30 (revolve, cut)
    with BuildSketch(Plane(origin=(-9.0126081794, 9.2279263615, 0), x_dir=(0, 0, 1), z_dir=(0.6987111461, -0.7154038959, 0))):
        with BuildLine():
            ThreePointArc((7.1, -38.1816506997), (6.5142135624, -39.5958642621), (5.1, -40.1816506997))
            Line((5.1, -40.1816506997), (7.1, -40.1816506997))
            Line((7.1, -40.1816506997), (7.1, -38.1816506997))
        make_face()
    revolve(axis=Axis((16.8718856926, 34.5084489895, 7.1), (0, 0, 1)), revolution_arc=F3_T30_ANGLE, mode=Mode.SUBTRACT)

    # F3_s31 → F3_t32 (revolve, cut)
    with BuildSketch(Plane(origin=(22.9194210249, -26.7874807354, 0), x_dir=(0, 0, 1), z_dir=(-0.6501161689, 0.7598348287, 0))):
        with BuildLine():
            ThreePointArc((0, 17.2520357401), (0.5857864376, 18.6662493025), (2, 19.2520357401))
            Line((2, 19.2520357401), (0, 19.2520357401))
            Line((0, 19.2520357401), (0, 17.2520357401))
        make_face()
    revolve(axis=Axis((34.5084489895, -16.8718856926, 0), (0, 0, -1)), revolution_arc=F3_T32_ANGLE, mode=Mode.SUBTRACT)

    # F3_s33 → F3_t34 (revolve, cut)
    with BuildSketch(Plane(origin=(9.2279263615, 9.0126081794, 0), x_dir=(0, 0, 1), z_dir=(-0.7154038959, -0.6987111461, 0))):
        with BuildLine():
            ThreePointArc((7.1, -38.1816506997), (6.5142135624, -39.5958642621), (5.1, -40.1816506997))
            Line((5.1, -40.1816506997), (7.1, -40.1816506997))
            Line((7.1, -40.1816506997), (7.1, -38.1816506997))
        make_face()
    revolve(axis=Axis((34.5084489895, -16.8718856926, 7.1), (0, 0, 1)), revolution_arc=F3_T34_ANGLE, mode=Mode.SUBTRACT)


solid = f1.part
